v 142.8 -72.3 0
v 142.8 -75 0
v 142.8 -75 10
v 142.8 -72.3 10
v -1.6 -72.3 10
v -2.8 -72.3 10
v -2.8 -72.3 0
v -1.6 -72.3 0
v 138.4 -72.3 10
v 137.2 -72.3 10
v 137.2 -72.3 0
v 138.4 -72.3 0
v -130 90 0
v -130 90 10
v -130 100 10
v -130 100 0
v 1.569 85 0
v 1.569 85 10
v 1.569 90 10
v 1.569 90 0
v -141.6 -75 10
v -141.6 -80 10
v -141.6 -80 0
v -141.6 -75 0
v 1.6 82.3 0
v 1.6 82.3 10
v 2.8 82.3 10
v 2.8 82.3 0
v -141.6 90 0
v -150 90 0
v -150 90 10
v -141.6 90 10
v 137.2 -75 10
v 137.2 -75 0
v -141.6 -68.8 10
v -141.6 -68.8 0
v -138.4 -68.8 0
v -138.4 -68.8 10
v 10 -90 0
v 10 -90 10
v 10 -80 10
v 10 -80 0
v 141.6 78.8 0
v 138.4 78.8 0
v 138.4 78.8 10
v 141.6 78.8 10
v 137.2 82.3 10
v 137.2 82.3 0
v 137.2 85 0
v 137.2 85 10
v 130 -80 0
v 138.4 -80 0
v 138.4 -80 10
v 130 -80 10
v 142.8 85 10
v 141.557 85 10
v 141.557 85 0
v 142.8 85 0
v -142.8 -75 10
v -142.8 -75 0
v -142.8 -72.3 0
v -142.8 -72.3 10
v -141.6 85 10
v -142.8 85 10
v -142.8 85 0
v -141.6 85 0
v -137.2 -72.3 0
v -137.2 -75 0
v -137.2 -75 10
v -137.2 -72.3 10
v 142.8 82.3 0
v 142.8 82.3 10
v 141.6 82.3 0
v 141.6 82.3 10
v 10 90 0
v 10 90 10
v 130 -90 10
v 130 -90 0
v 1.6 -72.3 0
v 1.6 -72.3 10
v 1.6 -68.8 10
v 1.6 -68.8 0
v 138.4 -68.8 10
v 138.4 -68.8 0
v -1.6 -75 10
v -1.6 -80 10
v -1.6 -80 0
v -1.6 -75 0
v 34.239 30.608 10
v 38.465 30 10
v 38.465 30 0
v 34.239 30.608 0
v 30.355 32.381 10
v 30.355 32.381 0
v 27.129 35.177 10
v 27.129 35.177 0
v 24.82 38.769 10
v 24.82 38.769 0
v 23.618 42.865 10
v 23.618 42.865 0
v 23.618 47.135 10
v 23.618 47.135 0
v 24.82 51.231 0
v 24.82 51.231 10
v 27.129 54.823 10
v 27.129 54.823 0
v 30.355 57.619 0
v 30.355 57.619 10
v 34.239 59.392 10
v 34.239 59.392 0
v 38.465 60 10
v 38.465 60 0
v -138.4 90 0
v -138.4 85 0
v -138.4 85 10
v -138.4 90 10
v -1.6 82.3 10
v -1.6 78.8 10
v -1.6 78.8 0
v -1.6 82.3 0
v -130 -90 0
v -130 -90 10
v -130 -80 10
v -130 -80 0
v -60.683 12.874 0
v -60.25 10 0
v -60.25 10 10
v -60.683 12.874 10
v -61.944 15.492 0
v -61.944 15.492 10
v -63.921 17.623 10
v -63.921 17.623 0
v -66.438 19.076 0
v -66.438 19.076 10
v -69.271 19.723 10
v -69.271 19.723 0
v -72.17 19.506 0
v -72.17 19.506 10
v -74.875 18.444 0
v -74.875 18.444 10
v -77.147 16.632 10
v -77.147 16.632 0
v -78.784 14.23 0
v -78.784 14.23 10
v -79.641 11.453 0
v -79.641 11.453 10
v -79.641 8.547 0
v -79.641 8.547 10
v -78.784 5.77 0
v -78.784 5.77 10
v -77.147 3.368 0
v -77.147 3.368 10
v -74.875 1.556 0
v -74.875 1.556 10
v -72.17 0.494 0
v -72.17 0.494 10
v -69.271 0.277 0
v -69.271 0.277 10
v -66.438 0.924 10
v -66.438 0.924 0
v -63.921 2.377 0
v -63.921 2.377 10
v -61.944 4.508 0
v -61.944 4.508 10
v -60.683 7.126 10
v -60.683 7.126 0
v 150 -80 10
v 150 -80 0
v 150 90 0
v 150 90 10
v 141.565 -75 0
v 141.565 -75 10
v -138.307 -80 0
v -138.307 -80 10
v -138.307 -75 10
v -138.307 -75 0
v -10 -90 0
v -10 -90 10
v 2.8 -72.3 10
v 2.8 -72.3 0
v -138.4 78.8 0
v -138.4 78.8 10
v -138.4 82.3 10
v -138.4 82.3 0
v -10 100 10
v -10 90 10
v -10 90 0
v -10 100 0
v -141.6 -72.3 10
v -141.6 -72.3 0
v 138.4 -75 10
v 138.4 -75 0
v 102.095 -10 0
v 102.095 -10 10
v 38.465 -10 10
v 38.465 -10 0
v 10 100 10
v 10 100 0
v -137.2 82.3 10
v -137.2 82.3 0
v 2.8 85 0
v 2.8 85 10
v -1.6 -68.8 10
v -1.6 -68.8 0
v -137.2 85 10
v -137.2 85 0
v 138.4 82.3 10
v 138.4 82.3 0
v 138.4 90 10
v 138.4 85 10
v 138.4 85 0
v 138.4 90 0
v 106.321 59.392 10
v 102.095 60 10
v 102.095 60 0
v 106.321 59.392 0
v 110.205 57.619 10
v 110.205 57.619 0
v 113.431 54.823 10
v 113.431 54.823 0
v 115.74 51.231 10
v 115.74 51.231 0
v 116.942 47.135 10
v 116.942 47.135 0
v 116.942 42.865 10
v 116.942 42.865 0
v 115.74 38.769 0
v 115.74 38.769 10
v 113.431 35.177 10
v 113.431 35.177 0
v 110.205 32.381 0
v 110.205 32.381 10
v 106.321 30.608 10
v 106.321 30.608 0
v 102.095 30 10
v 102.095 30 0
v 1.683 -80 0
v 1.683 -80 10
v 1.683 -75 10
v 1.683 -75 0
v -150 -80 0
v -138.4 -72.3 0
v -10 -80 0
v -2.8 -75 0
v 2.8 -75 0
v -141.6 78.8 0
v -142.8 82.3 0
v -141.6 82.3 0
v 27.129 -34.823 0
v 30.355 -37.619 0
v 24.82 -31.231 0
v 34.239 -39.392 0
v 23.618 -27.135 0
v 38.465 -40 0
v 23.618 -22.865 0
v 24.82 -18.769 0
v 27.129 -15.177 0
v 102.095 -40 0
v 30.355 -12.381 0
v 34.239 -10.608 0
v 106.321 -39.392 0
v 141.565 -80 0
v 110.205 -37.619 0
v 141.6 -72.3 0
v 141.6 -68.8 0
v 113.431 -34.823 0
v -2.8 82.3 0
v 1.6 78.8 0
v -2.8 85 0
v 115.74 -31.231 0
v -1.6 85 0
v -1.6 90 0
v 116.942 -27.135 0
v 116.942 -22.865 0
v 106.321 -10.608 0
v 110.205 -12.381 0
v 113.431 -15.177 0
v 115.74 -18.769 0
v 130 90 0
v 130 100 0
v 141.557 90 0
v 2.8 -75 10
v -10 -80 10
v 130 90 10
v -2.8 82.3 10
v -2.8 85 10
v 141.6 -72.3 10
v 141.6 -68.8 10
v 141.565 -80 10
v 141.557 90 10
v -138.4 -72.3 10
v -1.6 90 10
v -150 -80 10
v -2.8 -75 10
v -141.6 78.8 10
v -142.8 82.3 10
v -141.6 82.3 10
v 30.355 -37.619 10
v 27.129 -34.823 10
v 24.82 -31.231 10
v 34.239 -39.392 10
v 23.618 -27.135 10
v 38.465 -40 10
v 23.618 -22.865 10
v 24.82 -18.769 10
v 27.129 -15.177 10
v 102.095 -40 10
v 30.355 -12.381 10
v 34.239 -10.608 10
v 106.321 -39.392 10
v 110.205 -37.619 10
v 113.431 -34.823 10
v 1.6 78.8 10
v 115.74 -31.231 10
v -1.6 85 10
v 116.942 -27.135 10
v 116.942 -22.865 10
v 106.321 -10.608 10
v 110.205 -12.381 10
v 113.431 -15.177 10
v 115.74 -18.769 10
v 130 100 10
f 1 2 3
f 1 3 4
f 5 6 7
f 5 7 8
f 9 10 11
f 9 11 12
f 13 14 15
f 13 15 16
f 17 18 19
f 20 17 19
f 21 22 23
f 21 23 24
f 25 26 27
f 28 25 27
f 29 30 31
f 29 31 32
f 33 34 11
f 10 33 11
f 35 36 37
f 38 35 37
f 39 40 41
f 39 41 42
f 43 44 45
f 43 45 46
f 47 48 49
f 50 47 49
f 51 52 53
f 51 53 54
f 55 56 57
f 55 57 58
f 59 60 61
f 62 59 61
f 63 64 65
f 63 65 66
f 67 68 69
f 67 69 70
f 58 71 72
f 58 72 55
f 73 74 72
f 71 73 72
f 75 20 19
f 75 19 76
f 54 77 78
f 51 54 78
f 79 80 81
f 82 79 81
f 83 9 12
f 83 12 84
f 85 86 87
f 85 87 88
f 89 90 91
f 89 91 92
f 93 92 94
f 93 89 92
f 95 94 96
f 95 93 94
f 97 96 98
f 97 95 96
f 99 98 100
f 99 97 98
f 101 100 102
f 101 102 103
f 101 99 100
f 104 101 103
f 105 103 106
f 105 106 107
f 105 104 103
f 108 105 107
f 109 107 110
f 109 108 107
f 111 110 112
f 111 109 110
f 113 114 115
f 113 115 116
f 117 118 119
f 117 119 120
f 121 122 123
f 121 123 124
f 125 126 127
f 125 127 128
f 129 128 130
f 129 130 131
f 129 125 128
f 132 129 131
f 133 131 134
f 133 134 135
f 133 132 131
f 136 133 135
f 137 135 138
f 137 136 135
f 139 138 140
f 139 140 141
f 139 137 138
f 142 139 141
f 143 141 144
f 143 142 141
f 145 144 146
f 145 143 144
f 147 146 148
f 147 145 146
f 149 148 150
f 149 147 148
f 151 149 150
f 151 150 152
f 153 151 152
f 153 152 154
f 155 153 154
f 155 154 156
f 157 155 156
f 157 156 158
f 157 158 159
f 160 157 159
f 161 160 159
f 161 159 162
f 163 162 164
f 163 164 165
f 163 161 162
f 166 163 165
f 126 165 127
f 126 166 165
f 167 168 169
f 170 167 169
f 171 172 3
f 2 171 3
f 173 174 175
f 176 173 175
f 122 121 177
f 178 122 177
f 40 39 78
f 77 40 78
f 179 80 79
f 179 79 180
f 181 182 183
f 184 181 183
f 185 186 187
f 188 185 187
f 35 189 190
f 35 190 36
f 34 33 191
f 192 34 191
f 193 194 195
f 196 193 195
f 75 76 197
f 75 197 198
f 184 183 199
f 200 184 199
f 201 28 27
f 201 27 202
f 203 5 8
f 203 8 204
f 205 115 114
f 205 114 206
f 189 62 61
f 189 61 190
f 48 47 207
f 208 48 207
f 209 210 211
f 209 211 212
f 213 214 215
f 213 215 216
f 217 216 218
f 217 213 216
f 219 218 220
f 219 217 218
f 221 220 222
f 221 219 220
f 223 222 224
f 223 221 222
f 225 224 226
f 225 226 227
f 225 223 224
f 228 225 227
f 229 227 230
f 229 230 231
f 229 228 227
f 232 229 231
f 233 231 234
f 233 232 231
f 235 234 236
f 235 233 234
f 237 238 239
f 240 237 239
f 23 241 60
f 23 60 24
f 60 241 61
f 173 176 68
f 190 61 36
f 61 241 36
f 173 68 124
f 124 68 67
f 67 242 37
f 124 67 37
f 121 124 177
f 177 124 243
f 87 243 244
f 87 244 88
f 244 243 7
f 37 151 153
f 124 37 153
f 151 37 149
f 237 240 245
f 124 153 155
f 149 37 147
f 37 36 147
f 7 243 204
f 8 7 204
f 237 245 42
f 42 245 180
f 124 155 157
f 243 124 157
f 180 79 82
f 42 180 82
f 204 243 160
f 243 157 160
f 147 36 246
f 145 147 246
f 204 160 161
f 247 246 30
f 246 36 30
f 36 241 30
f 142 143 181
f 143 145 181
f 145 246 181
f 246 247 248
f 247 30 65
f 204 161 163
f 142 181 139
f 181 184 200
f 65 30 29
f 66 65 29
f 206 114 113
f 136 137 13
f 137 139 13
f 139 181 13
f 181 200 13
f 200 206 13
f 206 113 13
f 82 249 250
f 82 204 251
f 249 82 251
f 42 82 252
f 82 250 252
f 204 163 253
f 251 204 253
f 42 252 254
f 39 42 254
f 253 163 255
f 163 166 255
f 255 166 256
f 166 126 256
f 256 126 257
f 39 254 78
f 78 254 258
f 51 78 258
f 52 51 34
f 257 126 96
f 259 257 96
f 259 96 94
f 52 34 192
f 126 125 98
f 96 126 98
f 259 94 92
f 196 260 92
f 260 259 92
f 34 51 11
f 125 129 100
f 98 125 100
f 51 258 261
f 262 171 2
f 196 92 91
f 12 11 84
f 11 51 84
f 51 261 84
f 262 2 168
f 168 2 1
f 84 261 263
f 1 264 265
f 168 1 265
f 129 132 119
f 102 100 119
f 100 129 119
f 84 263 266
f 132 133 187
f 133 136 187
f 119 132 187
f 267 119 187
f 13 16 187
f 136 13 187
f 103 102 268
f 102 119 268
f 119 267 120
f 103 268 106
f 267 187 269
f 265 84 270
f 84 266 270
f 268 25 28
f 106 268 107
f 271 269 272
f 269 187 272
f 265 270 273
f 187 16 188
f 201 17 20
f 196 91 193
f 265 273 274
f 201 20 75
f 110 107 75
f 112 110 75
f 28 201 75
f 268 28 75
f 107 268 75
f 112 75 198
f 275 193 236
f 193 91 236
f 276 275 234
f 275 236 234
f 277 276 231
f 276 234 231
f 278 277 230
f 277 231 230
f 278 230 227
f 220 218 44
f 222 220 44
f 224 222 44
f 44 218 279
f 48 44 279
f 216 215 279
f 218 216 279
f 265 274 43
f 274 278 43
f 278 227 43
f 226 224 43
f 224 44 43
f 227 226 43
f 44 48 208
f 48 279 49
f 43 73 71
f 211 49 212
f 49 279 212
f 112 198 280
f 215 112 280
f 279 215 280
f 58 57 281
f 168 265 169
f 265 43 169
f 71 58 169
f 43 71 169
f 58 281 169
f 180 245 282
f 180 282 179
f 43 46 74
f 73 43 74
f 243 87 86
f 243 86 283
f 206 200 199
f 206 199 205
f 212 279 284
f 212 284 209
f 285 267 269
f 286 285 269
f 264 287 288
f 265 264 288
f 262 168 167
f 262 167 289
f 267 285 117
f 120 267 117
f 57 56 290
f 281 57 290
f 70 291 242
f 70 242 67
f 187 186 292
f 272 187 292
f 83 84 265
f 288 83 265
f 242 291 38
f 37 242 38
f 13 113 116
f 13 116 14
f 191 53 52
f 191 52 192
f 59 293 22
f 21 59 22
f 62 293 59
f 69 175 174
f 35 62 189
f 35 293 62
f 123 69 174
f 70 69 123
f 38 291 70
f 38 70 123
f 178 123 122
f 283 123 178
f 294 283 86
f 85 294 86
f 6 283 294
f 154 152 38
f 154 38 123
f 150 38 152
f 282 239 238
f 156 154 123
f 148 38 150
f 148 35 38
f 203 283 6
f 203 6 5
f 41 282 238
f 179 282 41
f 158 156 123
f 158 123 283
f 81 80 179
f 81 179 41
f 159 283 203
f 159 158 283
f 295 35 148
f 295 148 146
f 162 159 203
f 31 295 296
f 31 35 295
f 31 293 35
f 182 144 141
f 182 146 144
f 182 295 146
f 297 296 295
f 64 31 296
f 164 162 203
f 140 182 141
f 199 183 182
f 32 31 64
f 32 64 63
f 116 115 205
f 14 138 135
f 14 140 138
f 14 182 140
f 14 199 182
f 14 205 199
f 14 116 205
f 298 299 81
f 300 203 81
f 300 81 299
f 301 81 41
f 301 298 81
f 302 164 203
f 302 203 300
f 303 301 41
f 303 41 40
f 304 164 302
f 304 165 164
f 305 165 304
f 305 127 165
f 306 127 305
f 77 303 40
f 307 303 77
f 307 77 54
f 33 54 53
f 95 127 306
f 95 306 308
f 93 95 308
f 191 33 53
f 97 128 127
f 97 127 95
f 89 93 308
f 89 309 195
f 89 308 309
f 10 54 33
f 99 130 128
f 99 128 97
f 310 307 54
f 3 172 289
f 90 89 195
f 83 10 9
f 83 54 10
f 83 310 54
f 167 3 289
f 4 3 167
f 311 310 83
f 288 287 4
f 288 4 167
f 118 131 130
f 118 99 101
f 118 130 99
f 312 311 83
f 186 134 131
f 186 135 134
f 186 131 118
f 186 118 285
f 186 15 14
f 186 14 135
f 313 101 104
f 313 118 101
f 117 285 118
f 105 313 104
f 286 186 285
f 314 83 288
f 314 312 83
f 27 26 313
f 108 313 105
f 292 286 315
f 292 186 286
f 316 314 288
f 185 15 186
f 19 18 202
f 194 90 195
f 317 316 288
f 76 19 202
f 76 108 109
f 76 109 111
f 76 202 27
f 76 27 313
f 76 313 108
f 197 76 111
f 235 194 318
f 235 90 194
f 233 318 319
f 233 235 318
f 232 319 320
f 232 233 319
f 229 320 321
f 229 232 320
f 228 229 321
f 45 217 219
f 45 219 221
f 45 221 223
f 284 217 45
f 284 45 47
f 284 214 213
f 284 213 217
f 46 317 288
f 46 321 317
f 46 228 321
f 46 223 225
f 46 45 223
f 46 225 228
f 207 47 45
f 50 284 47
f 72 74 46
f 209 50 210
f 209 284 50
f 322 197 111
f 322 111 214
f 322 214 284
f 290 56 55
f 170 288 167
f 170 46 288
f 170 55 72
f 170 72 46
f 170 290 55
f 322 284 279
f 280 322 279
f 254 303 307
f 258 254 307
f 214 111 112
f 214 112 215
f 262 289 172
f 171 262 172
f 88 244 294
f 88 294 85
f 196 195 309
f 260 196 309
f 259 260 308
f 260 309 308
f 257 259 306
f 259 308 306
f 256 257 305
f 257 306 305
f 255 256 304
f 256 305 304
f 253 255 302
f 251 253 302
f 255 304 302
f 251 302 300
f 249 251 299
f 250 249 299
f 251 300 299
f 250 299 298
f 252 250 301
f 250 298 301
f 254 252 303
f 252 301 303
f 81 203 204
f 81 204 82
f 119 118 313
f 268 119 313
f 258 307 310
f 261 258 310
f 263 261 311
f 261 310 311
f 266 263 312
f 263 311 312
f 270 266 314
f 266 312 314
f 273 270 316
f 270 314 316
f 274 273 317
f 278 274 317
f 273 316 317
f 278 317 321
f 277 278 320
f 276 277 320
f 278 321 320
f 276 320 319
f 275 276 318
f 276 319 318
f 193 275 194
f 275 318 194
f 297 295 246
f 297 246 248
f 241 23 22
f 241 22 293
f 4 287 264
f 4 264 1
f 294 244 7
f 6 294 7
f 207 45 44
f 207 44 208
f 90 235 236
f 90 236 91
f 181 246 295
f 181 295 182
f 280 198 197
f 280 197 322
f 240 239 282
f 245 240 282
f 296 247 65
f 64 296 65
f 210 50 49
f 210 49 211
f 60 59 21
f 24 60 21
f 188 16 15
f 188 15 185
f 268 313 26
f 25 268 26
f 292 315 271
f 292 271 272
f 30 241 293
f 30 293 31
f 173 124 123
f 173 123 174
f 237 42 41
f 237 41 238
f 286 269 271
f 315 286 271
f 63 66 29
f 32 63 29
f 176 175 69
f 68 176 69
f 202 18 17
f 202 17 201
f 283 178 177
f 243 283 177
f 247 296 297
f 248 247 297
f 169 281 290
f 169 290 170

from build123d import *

# Parameters (mm, degrees)
IZIM1_W                     = 300
IZIM1_H                     = 180
IZIM1_R                     = 9.75
Y_KSEKLIK_EKSTR_ZYON1_DEPTH = 10
IZIM2_W                     = 120
IZIM2_H                     = 10
Y_KSEKLIK_EKSTR_ZYON2_DEPTH = 10
IZIM3_W                     = 20
IZIM3_H                     = 10
KES_EKSTR_ZYON1_DEPTH       = 10
IZIM4_W                     = 5.6
IZIM4_H                     = 2.7
KES_EKSTR_ZYON2_DEPTH       = 10
IZIM5_W                     = 3.2
IZIM5_H                     = 3.5
IZIM5_W_2                   = 3.168851203
IZIM5_H_2                   = 5
IZIM5_H_3                   = 5.09138305
IZIM5_W_3                   = 3.157417266
IZIM5_W_4                   = 3.164794192
IZIM5_W_5                   = 3.283155767
IZIM5_W_6                   = 3.292541888
KES_EKSTR_ZYON3_DEPTH       = 10
KES_EKSTR_ZYON4_DEPTH       = 10


with BuildPart() as part:
    # Çizim1 → Yükseklik-Ekstrüzyon1 (new body)
    with BuildSketch(Plane.XY):
        Rectangle(IZIM1_W, IZIM1_H)
        with Locations((-70, 10)):
            Circle(IZIM1_R, mode=Mode.SUBTRACT)
    extrude(amount=Y_KSEKLIK_EKSTR_ZYON1_DEPTH)

    # Çizim2 → Yükseklik-Ekstrüzyon2 (add)
    with BuildSketch(Plane(origin=(0, 90, 0), x_dir=(1, 0, 0), z_dir=(0, 1, 0))):
        with Locations((70, -5)):
            Rectangle(IZIM2_W, IZIM2_H)
        with Locations((-70, -5)):
            Rectangle(IZIM2_W, IZIM2_H)
    extrude(amount=Y_KSEKLIK_EKSTR_ZYON2_DEPTH)

    # Çizim3 → Kes-Ekstrüzyon1 (cut)
    with BuildSketch(Plane(origin=(0, -90, 0), x_dir=(-1, 0, 0), z_dir=(0, -1, 0))):
        with Locations((140, -5)):
            Rectangle(IZIM3_W, IZIM3_H)
        with Locations((-140, -5)):
            Rectangle(IZIM3_W, IZIM3_H)
        with Locations((0, -5)):
            Rectangle(IZIM3_W, IZIM3_H)
    extrude(amount=-KES_EKSTR_ZYON1_DEPTH, mode=Mode.SUBTRACT)

    # Çizim4 → Kes-Ekstrüzyon2 (cut)
    with BuildSketch(Plane.XY.offset(10)):
        with Locations((-140, 83.65)):
            Rectangle(IZIM4_W, IZIM4_H)
        with Locations((0, 83.65)):
            Rectangle(IZIM4_W, IZIM4_H)
        with Locations((140, 83.65)):
            Rectangle(IZIM4_W, IZIM4_H)
        with Locations((-140, -73.65)):
            Rectangle(IZIM4_W, IZIM4_H)
        with Locations((0, -73.65)):
            Rectangle(IZIM4_W, IZIM4_H)
        with Locations((140, -73.65)):
            Rectangle(IZIM4_W, IZIM4_H)
    extrude(amount=-KES_EKSTR_ZYON2_DEPTH, mode=Mode.SUBTRACT)

    # Çizim5 → Kes-Ekstrüzyon3 (cut)
    with BuildSketch(Plane.XY.offset(10)):
        with Locations((-140, 80.55)):
            Rectangle(IZIM5_W, IZIM5_H)
        with Locations((0, 80.55)):
            Rectangle(IZIM5_W, IZIM5_H)
        with Locations((140, 80.55)):
            Rectangle(IZIM5_W, IZIM5_H)
        with Locations((-140, -70.55)):
            Rectangle(IZIM5_W, IZIM5_H)
        with Locations((0, -70.55)):
            Rectangle(IZIM5_W, IZIM5_H)
        with Locations((-0.015574398, 87.5)):
            Rectangle(IZIM5_W_2, IZIM5_H_2)
        with Locations((140, -70.55)):
            Rectangle(IZIM5_W, IZIM5_H)
        with Locations((-140, 87.545691525)):
            Rectangle(IZIM5_W, IZIM5_H_3)
        with Locations((139.978708633, 87.5)):
            Rectangle(IZIM5_W_3, IZIM5_H_2)
        with Locations((139.982397096, -77.5)):
            Rectangle(IZIM5_W_4, IZIM5_H_2)
        with Locations((0.041577884, -77.5)):
            Rectangle(IZIM5_W_5, IZIM5_H_2)
        with Locations((-139.953729056, -77.5)):
            Rectangle(IZIM5_W_6, IZIM5_H_2)
    extrude(amount=-KES_EKSTR_ZYON3_DEPTH, mode=Mode.SUBTRACT)

    # Çizim6 → Kes-Ekstrüzyon4 (cut)
    with BuildSketch(Plane.XY.offset(10)):
        with BuildLine():
            Line((38.464975521, 60), (102.095024479, 60))
            ThreePointArc((102.095024479, 60), (117.095024479, 45), (102.095024479, 30))
            Line((102.095024479, 30), (38.464975521, 30))
            ThreePointArc((38.464975521, 30), (23.464975521, 45), (38.464975521, 60))
        make_face()
        with BuildLine():
            Line((38.464975521, -40), (102.095024479, -40))
            ThreePointArc((102.095024479, -40), (117.095024479, -25), (102.095024479, -10))
            Line((102.095024479, -10), (38.464975521, -10))
            ThreePointArc((38.464975521, -10), (23.464975521, -25), (38.464975521, -40))
        make_face()
    extrude(amount=-KES_EKSTR_ZYON4_DEPTH, mode=Mode.SUBTRACT)


solid = part.part
